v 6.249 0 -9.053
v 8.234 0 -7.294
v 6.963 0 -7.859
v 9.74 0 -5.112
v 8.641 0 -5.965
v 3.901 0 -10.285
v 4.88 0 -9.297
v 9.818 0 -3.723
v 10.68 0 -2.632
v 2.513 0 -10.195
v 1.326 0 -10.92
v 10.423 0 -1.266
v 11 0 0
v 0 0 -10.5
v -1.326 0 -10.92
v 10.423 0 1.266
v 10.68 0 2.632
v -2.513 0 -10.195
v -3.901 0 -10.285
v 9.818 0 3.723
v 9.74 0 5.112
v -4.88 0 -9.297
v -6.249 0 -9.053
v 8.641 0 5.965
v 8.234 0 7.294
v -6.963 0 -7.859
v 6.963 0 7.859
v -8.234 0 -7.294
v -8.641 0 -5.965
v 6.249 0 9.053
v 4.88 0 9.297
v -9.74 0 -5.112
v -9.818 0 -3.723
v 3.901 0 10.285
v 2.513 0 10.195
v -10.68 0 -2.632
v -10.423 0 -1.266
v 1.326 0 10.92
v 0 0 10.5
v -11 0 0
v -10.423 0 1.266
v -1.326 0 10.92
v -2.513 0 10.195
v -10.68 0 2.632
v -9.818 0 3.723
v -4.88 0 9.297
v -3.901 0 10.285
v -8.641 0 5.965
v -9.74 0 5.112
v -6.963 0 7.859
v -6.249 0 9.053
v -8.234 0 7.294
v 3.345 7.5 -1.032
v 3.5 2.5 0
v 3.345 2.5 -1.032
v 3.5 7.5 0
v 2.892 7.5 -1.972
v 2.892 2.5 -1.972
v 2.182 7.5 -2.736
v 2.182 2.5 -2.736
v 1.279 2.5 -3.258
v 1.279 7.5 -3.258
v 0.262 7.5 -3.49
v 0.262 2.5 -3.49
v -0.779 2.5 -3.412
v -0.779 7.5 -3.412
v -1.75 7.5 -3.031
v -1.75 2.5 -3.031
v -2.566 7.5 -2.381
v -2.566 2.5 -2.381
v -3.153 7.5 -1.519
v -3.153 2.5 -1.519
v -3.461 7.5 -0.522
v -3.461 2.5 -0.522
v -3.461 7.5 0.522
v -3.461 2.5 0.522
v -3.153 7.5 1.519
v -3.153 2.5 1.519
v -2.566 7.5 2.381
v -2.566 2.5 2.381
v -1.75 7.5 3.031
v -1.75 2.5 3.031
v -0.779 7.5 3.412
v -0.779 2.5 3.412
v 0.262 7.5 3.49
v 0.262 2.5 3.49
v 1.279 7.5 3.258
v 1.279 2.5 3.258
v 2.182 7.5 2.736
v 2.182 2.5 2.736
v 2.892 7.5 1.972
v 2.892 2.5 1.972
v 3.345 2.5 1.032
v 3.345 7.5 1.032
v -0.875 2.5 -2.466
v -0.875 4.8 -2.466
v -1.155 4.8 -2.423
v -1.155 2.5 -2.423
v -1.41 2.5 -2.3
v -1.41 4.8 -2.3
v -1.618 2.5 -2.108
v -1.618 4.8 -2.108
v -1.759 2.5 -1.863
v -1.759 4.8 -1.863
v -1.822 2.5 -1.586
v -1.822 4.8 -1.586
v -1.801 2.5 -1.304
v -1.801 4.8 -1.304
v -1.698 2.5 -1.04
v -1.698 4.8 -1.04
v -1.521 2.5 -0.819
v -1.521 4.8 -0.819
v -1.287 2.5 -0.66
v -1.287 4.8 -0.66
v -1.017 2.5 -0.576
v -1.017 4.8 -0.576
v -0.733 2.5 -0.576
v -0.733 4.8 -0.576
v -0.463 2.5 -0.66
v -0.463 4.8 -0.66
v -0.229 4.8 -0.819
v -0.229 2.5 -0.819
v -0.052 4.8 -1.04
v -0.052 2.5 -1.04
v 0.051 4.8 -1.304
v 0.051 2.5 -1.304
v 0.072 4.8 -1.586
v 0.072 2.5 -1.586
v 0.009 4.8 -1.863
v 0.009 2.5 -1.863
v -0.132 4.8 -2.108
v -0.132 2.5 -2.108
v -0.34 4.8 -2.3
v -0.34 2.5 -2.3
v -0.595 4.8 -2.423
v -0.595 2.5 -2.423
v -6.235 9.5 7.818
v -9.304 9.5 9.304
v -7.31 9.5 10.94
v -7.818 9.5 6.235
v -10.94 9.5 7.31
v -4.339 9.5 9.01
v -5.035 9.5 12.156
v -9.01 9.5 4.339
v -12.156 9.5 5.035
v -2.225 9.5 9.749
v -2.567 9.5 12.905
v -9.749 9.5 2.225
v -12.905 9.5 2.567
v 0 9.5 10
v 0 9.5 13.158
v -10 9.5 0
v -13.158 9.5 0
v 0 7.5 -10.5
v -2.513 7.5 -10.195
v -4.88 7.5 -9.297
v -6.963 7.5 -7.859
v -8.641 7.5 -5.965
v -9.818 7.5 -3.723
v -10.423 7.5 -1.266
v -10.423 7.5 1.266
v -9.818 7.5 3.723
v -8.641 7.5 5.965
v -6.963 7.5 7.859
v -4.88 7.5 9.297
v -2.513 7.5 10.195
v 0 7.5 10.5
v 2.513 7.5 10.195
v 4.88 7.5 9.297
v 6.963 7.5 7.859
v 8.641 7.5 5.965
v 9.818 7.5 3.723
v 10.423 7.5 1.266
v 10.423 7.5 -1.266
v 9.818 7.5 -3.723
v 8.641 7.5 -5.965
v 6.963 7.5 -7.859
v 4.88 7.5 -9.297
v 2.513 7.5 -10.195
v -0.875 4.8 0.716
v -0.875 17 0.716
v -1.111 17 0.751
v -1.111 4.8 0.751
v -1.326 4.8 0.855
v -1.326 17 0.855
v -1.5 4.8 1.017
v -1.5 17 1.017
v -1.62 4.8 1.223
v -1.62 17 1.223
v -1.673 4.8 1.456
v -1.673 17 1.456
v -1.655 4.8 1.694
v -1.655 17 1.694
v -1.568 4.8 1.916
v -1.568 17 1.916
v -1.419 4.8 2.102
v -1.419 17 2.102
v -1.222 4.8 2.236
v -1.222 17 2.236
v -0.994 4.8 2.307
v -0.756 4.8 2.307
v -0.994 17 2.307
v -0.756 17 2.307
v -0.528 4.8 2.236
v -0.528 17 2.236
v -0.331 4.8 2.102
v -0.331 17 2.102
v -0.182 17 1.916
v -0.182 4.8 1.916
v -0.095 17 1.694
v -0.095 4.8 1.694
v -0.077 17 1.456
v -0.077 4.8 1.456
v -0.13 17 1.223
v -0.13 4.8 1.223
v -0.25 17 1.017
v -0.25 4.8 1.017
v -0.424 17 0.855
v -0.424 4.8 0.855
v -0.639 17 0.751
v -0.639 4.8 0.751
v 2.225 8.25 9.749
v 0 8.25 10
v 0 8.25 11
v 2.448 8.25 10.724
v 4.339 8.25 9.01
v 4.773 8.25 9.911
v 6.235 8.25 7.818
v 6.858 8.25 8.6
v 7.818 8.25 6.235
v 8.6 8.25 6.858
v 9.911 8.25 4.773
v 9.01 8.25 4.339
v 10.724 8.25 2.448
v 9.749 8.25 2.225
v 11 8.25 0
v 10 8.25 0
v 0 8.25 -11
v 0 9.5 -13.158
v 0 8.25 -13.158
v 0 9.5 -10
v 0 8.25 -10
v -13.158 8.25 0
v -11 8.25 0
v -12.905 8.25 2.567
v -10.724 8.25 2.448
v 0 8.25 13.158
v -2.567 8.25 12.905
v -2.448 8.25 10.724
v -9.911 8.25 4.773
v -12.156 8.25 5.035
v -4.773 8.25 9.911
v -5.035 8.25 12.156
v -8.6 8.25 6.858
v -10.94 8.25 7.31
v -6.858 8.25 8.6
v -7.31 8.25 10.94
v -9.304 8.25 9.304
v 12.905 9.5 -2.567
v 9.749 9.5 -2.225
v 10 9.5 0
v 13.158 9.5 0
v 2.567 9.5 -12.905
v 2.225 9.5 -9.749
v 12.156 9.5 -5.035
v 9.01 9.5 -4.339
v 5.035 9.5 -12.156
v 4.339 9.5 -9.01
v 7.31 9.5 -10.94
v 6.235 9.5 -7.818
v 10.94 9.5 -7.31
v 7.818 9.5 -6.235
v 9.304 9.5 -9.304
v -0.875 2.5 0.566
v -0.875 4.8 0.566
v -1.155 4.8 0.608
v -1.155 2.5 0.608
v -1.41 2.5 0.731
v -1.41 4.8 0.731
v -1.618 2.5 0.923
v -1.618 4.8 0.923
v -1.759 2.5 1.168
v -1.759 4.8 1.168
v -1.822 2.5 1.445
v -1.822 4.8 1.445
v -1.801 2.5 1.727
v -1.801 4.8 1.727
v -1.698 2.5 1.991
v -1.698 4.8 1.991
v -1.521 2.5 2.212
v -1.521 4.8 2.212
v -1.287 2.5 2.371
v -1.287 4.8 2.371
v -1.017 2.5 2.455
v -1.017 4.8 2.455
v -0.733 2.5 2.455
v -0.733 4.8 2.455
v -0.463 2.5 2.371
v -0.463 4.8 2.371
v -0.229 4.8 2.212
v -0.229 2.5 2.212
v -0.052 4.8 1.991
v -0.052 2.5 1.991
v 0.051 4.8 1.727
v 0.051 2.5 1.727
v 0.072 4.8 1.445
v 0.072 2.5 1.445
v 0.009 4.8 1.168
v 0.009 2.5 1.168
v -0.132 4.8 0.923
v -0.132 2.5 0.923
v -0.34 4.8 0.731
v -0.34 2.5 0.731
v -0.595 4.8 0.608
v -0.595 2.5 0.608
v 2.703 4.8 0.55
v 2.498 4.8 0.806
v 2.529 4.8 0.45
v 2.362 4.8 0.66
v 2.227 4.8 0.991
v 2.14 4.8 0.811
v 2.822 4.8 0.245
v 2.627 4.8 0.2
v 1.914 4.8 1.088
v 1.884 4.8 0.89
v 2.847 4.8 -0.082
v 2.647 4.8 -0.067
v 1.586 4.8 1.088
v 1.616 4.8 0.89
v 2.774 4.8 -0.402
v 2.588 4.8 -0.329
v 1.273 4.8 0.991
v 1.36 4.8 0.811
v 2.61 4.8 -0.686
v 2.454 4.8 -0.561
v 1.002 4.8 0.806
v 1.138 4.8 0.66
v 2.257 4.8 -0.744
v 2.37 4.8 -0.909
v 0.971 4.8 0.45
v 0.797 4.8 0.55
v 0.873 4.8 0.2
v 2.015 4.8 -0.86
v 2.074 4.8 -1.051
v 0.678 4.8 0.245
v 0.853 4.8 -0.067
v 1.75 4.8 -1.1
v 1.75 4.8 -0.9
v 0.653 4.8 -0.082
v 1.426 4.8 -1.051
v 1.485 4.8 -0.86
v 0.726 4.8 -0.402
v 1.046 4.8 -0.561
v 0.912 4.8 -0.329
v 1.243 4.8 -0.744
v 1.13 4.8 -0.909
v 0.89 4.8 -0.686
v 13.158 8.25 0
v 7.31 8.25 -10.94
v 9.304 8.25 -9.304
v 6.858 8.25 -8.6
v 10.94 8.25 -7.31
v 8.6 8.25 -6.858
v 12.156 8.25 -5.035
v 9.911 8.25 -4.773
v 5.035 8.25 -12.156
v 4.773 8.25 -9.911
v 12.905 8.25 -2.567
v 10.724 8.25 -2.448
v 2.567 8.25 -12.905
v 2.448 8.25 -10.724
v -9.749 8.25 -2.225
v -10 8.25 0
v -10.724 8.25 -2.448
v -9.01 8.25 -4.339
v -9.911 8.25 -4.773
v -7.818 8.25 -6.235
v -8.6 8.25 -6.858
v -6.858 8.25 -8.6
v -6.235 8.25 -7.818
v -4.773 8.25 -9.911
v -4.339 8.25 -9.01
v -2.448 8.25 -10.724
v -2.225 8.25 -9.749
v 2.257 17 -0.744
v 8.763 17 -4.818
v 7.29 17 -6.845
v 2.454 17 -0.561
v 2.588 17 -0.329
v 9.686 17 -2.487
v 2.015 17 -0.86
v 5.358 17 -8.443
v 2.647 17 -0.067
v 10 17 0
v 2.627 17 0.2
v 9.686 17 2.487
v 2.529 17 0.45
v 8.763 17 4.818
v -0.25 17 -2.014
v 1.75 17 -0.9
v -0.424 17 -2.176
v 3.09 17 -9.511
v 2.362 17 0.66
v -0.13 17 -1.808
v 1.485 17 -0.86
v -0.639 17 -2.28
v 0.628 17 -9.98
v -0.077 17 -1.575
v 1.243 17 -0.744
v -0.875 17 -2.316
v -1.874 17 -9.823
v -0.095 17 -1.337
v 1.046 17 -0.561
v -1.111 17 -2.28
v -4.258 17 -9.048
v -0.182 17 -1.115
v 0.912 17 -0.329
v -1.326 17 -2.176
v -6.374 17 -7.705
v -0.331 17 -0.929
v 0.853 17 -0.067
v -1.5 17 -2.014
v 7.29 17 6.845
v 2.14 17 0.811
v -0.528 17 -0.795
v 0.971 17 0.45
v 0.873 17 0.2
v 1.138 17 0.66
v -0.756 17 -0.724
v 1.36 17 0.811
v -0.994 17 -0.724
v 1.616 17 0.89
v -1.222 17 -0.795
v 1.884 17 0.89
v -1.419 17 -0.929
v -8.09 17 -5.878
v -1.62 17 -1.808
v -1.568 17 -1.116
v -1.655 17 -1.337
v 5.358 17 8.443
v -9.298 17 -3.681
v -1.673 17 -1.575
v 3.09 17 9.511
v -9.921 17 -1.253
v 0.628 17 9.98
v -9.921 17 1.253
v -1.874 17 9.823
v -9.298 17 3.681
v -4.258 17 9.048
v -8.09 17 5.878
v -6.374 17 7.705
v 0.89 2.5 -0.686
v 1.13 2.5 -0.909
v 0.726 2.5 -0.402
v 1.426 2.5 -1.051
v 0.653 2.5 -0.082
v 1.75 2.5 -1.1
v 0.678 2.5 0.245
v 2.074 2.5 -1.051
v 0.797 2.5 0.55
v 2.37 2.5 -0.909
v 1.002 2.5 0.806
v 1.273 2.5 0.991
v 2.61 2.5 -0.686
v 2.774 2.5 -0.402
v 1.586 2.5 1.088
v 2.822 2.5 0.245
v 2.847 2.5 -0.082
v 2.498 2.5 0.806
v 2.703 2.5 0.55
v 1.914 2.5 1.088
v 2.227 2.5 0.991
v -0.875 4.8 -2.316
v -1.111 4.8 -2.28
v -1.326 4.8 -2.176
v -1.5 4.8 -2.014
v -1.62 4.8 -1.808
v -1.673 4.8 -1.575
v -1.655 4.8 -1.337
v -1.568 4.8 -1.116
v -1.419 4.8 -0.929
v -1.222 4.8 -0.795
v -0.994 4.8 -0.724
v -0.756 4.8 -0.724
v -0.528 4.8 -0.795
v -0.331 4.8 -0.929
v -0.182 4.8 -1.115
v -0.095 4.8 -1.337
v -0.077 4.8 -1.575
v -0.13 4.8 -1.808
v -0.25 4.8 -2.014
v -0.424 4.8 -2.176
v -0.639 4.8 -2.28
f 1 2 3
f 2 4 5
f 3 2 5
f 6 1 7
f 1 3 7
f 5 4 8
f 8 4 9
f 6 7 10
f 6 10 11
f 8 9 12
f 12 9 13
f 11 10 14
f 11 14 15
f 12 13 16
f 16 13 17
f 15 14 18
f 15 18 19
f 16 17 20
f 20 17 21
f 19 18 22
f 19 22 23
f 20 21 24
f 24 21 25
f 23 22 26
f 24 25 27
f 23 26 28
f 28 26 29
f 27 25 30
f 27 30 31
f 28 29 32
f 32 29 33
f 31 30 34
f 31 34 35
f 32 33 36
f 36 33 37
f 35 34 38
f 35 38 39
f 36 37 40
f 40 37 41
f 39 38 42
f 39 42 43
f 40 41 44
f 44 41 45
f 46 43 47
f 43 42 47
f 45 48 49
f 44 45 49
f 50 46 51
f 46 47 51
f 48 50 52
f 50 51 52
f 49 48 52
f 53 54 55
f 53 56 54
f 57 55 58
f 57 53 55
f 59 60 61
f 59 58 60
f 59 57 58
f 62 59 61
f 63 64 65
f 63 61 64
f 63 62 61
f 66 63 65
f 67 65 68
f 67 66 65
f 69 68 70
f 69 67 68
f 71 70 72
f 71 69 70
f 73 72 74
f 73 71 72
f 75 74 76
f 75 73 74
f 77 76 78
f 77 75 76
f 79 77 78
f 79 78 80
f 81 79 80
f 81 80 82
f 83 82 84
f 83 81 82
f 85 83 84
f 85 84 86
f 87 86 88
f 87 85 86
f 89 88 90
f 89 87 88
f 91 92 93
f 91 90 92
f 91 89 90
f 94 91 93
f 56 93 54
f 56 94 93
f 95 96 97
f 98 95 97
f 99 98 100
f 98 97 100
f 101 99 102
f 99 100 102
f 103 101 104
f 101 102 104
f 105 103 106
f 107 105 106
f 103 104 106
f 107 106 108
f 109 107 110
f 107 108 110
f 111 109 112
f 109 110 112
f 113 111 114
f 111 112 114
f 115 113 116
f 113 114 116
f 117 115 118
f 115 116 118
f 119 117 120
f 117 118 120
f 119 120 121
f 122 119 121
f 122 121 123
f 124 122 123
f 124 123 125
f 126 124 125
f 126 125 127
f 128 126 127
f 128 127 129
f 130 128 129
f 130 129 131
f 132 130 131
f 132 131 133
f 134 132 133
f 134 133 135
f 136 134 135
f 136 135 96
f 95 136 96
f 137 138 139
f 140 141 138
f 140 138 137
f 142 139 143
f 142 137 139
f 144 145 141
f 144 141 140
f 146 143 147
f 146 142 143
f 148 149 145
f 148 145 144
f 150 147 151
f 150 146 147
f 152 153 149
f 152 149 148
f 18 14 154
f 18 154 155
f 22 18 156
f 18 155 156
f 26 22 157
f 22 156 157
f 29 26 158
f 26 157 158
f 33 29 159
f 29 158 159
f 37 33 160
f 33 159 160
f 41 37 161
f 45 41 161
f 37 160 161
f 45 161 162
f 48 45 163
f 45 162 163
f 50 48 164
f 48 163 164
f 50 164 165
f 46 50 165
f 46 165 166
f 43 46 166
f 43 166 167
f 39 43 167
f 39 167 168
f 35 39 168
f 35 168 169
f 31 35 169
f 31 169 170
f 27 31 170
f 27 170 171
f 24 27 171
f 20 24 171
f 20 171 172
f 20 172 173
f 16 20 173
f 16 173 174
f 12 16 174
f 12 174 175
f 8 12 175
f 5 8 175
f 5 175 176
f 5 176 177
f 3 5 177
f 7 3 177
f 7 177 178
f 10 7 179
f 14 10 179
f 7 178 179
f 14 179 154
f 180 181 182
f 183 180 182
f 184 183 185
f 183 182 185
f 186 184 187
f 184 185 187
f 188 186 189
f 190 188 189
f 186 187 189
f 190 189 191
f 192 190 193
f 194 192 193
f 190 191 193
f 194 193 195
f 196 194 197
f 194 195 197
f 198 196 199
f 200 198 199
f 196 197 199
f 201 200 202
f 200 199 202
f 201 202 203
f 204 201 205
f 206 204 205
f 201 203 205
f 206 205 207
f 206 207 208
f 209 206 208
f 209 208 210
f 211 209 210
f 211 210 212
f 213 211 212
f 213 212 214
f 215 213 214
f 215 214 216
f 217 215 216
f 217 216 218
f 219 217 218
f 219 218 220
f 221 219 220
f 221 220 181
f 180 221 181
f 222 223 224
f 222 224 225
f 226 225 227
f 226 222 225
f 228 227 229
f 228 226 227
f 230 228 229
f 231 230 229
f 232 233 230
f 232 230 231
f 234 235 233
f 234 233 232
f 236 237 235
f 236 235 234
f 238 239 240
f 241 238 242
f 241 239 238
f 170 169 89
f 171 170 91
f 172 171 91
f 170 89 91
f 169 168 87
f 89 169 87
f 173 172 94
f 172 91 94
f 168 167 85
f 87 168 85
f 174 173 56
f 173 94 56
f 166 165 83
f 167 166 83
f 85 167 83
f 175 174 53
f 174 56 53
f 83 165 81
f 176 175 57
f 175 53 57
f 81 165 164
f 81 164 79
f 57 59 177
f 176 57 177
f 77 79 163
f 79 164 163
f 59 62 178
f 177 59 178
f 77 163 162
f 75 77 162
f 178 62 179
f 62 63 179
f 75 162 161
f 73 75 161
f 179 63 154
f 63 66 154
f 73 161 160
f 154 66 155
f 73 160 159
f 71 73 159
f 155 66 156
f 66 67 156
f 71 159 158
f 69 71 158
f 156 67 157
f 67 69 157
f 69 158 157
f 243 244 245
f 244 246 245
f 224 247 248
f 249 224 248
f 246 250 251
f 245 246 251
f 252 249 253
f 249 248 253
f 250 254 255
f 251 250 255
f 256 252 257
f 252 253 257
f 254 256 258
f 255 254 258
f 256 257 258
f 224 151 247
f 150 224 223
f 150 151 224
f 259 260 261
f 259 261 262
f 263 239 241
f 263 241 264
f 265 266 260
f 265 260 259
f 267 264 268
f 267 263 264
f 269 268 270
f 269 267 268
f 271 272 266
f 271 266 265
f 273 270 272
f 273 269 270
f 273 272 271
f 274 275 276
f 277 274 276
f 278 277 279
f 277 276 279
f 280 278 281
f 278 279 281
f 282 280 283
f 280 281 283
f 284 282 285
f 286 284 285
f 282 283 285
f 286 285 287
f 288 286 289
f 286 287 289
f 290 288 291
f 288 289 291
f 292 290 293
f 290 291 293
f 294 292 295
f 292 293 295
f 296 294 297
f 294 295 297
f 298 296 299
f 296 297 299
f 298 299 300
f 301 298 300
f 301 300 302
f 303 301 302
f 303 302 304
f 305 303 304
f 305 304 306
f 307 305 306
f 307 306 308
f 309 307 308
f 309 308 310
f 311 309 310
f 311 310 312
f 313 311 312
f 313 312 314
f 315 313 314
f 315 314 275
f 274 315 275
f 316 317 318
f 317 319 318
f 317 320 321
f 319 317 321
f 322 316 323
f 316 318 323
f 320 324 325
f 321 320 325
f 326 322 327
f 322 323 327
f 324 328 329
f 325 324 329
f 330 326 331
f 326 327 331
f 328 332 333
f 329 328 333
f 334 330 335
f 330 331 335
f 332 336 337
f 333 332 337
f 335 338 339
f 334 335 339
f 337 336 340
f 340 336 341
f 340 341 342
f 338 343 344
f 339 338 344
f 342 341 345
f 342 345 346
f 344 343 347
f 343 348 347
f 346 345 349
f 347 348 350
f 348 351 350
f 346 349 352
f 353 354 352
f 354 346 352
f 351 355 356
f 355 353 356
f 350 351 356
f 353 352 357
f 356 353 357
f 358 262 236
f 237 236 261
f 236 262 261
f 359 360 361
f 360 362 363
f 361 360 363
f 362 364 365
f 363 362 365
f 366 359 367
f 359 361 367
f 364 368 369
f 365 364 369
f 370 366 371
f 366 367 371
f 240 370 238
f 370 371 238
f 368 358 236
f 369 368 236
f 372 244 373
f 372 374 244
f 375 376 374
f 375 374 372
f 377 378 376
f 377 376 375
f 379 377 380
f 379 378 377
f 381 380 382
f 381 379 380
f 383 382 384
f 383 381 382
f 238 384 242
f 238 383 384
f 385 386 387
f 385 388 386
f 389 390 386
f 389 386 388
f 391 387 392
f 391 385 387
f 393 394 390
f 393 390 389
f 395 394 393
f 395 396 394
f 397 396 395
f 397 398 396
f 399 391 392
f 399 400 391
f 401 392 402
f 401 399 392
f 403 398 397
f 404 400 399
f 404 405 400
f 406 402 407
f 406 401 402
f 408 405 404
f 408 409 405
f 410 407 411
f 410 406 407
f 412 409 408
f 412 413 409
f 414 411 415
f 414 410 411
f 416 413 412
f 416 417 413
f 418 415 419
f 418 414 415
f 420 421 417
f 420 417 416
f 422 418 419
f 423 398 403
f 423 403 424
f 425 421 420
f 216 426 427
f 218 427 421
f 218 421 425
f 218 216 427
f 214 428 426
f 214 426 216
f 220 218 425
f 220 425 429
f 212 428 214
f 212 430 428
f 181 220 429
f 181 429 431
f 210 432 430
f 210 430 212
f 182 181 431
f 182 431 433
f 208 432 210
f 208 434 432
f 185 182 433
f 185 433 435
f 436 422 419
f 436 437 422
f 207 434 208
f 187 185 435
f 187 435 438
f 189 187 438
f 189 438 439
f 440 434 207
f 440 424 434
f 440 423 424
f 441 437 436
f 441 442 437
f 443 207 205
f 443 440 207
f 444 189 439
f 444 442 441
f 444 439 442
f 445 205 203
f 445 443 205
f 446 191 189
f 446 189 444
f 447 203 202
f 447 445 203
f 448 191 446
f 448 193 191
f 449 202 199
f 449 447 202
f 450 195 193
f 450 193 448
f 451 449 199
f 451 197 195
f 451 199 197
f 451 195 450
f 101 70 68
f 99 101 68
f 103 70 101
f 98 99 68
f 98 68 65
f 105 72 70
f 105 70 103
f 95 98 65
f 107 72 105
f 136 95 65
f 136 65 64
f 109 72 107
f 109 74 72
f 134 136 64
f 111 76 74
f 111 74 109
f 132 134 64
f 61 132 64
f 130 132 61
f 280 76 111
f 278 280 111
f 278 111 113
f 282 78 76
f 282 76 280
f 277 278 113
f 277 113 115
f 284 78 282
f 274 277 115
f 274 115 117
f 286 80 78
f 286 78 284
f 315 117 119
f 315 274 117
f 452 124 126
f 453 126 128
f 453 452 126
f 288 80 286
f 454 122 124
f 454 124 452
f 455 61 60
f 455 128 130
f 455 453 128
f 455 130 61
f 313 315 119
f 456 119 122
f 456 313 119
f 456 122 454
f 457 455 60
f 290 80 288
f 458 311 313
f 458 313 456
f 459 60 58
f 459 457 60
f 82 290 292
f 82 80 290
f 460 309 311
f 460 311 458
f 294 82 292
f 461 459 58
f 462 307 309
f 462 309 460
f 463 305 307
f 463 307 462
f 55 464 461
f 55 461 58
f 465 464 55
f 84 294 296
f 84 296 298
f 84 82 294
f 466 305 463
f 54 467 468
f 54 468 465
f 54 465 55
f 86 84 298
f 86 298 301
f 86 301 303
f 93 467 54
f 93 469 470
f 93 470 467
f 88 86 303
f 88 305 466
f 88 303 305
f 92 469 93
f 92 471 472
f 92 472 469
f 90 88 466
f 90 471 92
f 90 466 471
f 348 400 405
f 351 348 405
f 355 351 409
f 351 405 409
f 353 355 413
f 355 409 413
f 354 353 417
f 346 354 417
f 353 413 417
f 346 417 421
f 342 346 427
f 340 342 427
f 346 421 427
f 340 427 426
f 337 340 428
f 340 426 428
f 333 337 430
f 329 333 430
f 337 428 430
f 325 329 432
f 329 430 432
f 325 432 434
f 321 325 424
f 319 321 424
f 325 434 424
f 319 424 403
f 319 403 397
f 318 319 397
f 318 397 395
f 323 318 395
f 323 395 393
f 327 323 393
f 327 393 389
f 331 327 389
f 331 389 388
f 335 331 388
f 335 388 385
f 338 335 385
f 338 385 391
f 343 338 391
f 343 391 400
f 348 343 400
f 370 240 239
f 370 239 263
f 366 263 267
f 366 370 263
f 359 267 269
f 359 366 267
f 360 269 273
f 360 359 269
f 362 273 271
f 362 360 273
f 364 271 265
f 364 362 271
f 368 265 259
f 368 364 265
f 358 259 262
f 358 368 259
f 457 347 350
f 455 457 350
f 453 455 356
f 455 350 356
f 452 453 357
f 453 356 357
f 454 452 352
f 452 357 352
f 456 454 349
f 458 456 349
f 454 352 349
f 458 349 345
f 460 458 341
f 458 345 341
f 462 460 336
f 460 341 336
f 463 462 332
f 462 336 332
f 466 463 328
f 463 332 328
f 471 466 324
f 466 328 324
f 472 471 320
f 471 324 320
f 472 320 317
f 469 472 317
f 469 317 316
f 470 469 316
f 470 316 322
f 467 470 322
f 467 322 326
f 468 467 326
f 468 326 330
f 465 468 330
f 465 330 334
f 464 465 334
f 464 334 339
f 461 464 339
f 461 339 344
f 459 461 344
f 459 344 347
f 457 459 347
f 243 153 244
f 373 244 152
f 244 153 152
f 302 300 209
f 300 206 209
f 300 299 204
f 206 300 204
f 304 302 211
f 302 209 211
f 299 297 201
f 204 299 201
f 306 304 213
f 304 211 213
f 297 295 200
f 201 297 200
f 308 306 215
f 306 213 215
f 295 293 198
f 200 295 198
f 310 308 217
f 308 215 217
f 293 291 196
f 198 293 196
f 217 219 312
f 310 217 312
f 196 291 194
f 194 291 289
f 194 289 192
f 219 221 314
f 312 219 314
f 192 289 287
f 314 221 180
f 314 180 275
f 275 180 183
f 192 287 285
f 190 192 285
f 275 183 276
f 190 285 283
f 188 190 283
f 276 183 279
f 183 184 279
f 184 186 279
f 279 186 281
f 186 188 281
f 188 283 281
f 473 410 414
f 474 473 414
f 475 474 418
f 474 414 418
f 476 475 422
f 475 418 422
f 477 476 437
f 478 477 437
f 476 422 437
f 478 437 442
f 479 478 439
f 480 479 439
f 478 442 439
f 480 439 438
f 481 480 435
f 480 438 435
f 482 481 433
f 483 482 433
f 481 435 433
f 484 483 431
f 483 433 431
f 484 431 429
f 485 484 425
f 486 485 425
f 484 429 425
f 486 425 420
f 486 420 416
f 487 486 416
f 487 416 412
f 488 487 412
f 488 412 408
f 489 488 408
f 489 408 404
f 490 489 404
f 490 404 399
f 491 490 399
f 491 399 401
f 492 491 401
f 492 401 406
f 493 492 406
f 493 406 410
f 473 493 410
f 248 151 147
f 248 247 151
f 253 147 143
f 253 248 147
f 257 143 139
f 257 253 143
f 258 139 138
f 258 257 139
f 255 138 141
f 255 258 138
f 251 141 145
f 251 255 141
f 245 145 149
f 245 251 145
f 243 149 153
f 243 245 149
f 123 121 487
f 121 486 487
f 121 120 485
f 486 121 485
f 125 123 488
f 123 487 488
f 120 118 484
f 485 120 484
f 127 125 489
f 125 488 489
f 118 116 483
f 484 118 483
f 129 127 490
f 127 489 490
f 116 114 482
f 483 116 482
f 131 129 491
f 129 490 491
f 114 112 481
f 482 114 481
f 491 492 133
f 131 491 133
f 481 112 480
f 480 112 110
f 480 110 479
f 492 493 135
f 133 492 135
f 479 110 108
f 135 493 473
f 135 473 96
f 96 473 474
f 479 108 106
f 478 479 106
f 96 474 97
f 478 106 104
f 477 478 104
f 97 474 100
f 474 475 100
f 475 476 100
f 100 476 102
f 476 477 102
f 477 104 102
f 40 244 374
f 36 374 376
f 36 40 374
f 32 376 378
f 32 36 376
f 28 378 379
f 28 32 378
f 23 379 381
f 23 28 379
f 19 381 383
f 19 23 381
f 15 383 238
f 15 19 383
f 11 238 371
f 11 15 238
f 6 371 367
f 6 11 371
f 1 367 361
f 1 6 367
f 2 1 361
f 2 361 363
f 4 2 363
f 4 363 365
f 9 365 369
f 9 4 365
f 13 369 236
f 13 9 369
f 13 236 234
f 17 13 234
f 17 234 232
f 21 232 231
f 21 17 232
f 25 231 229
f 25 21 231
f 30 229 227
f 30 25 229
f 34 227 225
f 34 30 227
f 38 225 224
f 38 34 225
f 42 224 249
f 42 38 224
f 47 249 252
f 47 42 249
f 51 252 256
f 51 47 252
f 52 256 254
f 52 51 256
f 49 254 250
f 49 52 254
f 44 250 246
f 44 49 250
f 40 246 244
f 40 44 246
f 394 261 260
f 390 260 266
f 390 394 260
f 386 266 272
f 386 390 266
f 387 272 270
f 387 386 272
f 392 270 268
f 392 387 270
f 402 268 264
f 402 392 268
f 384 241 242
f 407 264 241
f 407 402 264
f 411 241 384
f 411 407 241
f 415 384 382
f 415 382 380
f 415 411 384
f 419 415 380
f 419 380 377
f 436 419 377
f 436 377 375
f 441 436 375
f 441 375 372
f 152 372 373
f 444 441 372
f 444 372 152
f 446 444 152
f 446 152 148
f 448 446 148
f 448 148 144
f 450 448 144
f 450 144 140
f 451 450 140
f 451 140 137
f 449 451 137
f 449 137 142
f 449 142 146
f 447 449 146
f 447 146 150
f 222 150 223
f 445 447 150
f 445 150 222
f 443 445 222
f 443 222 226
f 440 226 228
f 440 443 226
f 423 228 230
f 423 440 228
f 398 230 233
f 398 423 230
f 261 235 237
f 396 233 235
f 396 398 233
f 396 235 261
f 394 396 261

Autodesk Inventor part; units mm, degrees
ref_plane "YZ Plane" through (0, 0, 0) normal (1, 0, 0) x (0, 1, 0)
ref_plane "XZ Plane" through (0, 0, 0) normal (0, 1, 0) x (-1, 0, 0)
ref_plane "XY Plane" through (0, 0, 0) normal (0, 0, 1) x (1, 0, 0)
sketch "Sketch1" plane through (0, 0, 0) normal (0, 1, 0) x (-1, 0, 0)
  circle A0 centre (0, 0) radius 11
  circle A1 centre (0, 0) radius 13.1577
  dimension "d0" = 22
  dimension "d40" = 26.3154
extrude "Extrusion1" add sketch "Sketch1" along normal blind 17 contours A0
hole "Hole1" at (0, 0, 0) direction (0, 1, 0) diameter 21 depth 7.5
ref_plane "Work Plane1" through (0, 12.25, 0) normal (0, -1, 0) x (1, 0, 0)
sketch "Sketch2" plane through (0, 7.5, 0) normal (0, -1, 0) x (1, 0, 0)
  circle A0 centre (0, 0) radius 3.5
  line L0 (0, 0) -> (2, 0) construction
  line L1 (0, 0) -> (2, 0) construction
  dimension "d10" = 7
extrude "Extrusion2" add sketch "Sketch2" along normal blind 5
sketch "Sketch3" plane through (0, 2.5, 0) normal (0, -1, 0) x (1, 0, 0)
  line L0 (0, 0) -> (-0.875, -1.5155)
  line L1 (0, 0) -> (1.75, 0) construction
  line L2 (0, 0) -> (-0.875, 1.5155)
  dimension "d19" = 1.75
  dimension "d20" = 120
  dimension "d21" = 1.75
hole "Hole2" at (-0.875, 2.5, -1.5155) at (-0.875, 2.5, 1.5155) direction (0, 1, 0) diameter 1.6 depth 24
hole "Hole3" at (1.75, 2.5, 0) direction (0, 1, 0) diameter 1.8 depth 23.25
ref_plane "Work Plane2" through (0, 12.25, 0) normal (0, 1, 0) x (1, 0, 0)
extrude "Extrusion3" add sketch "Sketch1" along normal blind 17
extrude "Extrusion4" cut sketch "Sketch1" along normal blind 8.25
sketch "Sketch4" plane through (0, 17, 0) normal (0, 1, 0) x (1, 0, 0)
  circle A0 centre (0, 0) radius 13.1577
  circle A1 centre (0, 0) radius 10
extrude "Extrusion5" cut sketch "Sketch4" against normal blind 7.5
sketch "Sketch5" plane through (0, 9.5, 0) normal (0, 1, 0) x (1, 0, 0)
  circle A0 centre (0, 0) radius 13.1577 projected
  arc A1 (0, -13.1577) -> (13.1577, 0) centre (0, 0) ccw
  line L0 (13.1577, 0) -> (10, 0)
  circle A2 centre (0, 0) radius 10 projected
  arc A3 (0, 13.1577) -> (-13.1577, 0) centre (0, 0) ccw
  line L1 (-13.1577, 0) -> (-10, 0)
  line L2 (0, 13.1577) -> (0, 10)
  arc A4 (0, -10) -> (10, 0) centre (0, 0) ccw
  arc A5 (0, 10) -> (-10, 0) centre (0, 0) ccw
  line L3 (0, -13.1577) -> (0, -10)
extrude "Extrusion6" cut sketch "Sketch5" against normal blind 1.25 contours A0 L3 A2 L0 | L2 A2 L1 A0
hole "Hole4" at (1.75, 2.5, 0) direction (0, 1, 0) diameter 2.2 depth 2.3
hole "Hole5" at (-0.875, 2.5, 1.5155) at (-0.875, 2.5, -1.5155) direction (0, 1, 0) diameter 1.9 depth 2.3
properties part number "cap"
